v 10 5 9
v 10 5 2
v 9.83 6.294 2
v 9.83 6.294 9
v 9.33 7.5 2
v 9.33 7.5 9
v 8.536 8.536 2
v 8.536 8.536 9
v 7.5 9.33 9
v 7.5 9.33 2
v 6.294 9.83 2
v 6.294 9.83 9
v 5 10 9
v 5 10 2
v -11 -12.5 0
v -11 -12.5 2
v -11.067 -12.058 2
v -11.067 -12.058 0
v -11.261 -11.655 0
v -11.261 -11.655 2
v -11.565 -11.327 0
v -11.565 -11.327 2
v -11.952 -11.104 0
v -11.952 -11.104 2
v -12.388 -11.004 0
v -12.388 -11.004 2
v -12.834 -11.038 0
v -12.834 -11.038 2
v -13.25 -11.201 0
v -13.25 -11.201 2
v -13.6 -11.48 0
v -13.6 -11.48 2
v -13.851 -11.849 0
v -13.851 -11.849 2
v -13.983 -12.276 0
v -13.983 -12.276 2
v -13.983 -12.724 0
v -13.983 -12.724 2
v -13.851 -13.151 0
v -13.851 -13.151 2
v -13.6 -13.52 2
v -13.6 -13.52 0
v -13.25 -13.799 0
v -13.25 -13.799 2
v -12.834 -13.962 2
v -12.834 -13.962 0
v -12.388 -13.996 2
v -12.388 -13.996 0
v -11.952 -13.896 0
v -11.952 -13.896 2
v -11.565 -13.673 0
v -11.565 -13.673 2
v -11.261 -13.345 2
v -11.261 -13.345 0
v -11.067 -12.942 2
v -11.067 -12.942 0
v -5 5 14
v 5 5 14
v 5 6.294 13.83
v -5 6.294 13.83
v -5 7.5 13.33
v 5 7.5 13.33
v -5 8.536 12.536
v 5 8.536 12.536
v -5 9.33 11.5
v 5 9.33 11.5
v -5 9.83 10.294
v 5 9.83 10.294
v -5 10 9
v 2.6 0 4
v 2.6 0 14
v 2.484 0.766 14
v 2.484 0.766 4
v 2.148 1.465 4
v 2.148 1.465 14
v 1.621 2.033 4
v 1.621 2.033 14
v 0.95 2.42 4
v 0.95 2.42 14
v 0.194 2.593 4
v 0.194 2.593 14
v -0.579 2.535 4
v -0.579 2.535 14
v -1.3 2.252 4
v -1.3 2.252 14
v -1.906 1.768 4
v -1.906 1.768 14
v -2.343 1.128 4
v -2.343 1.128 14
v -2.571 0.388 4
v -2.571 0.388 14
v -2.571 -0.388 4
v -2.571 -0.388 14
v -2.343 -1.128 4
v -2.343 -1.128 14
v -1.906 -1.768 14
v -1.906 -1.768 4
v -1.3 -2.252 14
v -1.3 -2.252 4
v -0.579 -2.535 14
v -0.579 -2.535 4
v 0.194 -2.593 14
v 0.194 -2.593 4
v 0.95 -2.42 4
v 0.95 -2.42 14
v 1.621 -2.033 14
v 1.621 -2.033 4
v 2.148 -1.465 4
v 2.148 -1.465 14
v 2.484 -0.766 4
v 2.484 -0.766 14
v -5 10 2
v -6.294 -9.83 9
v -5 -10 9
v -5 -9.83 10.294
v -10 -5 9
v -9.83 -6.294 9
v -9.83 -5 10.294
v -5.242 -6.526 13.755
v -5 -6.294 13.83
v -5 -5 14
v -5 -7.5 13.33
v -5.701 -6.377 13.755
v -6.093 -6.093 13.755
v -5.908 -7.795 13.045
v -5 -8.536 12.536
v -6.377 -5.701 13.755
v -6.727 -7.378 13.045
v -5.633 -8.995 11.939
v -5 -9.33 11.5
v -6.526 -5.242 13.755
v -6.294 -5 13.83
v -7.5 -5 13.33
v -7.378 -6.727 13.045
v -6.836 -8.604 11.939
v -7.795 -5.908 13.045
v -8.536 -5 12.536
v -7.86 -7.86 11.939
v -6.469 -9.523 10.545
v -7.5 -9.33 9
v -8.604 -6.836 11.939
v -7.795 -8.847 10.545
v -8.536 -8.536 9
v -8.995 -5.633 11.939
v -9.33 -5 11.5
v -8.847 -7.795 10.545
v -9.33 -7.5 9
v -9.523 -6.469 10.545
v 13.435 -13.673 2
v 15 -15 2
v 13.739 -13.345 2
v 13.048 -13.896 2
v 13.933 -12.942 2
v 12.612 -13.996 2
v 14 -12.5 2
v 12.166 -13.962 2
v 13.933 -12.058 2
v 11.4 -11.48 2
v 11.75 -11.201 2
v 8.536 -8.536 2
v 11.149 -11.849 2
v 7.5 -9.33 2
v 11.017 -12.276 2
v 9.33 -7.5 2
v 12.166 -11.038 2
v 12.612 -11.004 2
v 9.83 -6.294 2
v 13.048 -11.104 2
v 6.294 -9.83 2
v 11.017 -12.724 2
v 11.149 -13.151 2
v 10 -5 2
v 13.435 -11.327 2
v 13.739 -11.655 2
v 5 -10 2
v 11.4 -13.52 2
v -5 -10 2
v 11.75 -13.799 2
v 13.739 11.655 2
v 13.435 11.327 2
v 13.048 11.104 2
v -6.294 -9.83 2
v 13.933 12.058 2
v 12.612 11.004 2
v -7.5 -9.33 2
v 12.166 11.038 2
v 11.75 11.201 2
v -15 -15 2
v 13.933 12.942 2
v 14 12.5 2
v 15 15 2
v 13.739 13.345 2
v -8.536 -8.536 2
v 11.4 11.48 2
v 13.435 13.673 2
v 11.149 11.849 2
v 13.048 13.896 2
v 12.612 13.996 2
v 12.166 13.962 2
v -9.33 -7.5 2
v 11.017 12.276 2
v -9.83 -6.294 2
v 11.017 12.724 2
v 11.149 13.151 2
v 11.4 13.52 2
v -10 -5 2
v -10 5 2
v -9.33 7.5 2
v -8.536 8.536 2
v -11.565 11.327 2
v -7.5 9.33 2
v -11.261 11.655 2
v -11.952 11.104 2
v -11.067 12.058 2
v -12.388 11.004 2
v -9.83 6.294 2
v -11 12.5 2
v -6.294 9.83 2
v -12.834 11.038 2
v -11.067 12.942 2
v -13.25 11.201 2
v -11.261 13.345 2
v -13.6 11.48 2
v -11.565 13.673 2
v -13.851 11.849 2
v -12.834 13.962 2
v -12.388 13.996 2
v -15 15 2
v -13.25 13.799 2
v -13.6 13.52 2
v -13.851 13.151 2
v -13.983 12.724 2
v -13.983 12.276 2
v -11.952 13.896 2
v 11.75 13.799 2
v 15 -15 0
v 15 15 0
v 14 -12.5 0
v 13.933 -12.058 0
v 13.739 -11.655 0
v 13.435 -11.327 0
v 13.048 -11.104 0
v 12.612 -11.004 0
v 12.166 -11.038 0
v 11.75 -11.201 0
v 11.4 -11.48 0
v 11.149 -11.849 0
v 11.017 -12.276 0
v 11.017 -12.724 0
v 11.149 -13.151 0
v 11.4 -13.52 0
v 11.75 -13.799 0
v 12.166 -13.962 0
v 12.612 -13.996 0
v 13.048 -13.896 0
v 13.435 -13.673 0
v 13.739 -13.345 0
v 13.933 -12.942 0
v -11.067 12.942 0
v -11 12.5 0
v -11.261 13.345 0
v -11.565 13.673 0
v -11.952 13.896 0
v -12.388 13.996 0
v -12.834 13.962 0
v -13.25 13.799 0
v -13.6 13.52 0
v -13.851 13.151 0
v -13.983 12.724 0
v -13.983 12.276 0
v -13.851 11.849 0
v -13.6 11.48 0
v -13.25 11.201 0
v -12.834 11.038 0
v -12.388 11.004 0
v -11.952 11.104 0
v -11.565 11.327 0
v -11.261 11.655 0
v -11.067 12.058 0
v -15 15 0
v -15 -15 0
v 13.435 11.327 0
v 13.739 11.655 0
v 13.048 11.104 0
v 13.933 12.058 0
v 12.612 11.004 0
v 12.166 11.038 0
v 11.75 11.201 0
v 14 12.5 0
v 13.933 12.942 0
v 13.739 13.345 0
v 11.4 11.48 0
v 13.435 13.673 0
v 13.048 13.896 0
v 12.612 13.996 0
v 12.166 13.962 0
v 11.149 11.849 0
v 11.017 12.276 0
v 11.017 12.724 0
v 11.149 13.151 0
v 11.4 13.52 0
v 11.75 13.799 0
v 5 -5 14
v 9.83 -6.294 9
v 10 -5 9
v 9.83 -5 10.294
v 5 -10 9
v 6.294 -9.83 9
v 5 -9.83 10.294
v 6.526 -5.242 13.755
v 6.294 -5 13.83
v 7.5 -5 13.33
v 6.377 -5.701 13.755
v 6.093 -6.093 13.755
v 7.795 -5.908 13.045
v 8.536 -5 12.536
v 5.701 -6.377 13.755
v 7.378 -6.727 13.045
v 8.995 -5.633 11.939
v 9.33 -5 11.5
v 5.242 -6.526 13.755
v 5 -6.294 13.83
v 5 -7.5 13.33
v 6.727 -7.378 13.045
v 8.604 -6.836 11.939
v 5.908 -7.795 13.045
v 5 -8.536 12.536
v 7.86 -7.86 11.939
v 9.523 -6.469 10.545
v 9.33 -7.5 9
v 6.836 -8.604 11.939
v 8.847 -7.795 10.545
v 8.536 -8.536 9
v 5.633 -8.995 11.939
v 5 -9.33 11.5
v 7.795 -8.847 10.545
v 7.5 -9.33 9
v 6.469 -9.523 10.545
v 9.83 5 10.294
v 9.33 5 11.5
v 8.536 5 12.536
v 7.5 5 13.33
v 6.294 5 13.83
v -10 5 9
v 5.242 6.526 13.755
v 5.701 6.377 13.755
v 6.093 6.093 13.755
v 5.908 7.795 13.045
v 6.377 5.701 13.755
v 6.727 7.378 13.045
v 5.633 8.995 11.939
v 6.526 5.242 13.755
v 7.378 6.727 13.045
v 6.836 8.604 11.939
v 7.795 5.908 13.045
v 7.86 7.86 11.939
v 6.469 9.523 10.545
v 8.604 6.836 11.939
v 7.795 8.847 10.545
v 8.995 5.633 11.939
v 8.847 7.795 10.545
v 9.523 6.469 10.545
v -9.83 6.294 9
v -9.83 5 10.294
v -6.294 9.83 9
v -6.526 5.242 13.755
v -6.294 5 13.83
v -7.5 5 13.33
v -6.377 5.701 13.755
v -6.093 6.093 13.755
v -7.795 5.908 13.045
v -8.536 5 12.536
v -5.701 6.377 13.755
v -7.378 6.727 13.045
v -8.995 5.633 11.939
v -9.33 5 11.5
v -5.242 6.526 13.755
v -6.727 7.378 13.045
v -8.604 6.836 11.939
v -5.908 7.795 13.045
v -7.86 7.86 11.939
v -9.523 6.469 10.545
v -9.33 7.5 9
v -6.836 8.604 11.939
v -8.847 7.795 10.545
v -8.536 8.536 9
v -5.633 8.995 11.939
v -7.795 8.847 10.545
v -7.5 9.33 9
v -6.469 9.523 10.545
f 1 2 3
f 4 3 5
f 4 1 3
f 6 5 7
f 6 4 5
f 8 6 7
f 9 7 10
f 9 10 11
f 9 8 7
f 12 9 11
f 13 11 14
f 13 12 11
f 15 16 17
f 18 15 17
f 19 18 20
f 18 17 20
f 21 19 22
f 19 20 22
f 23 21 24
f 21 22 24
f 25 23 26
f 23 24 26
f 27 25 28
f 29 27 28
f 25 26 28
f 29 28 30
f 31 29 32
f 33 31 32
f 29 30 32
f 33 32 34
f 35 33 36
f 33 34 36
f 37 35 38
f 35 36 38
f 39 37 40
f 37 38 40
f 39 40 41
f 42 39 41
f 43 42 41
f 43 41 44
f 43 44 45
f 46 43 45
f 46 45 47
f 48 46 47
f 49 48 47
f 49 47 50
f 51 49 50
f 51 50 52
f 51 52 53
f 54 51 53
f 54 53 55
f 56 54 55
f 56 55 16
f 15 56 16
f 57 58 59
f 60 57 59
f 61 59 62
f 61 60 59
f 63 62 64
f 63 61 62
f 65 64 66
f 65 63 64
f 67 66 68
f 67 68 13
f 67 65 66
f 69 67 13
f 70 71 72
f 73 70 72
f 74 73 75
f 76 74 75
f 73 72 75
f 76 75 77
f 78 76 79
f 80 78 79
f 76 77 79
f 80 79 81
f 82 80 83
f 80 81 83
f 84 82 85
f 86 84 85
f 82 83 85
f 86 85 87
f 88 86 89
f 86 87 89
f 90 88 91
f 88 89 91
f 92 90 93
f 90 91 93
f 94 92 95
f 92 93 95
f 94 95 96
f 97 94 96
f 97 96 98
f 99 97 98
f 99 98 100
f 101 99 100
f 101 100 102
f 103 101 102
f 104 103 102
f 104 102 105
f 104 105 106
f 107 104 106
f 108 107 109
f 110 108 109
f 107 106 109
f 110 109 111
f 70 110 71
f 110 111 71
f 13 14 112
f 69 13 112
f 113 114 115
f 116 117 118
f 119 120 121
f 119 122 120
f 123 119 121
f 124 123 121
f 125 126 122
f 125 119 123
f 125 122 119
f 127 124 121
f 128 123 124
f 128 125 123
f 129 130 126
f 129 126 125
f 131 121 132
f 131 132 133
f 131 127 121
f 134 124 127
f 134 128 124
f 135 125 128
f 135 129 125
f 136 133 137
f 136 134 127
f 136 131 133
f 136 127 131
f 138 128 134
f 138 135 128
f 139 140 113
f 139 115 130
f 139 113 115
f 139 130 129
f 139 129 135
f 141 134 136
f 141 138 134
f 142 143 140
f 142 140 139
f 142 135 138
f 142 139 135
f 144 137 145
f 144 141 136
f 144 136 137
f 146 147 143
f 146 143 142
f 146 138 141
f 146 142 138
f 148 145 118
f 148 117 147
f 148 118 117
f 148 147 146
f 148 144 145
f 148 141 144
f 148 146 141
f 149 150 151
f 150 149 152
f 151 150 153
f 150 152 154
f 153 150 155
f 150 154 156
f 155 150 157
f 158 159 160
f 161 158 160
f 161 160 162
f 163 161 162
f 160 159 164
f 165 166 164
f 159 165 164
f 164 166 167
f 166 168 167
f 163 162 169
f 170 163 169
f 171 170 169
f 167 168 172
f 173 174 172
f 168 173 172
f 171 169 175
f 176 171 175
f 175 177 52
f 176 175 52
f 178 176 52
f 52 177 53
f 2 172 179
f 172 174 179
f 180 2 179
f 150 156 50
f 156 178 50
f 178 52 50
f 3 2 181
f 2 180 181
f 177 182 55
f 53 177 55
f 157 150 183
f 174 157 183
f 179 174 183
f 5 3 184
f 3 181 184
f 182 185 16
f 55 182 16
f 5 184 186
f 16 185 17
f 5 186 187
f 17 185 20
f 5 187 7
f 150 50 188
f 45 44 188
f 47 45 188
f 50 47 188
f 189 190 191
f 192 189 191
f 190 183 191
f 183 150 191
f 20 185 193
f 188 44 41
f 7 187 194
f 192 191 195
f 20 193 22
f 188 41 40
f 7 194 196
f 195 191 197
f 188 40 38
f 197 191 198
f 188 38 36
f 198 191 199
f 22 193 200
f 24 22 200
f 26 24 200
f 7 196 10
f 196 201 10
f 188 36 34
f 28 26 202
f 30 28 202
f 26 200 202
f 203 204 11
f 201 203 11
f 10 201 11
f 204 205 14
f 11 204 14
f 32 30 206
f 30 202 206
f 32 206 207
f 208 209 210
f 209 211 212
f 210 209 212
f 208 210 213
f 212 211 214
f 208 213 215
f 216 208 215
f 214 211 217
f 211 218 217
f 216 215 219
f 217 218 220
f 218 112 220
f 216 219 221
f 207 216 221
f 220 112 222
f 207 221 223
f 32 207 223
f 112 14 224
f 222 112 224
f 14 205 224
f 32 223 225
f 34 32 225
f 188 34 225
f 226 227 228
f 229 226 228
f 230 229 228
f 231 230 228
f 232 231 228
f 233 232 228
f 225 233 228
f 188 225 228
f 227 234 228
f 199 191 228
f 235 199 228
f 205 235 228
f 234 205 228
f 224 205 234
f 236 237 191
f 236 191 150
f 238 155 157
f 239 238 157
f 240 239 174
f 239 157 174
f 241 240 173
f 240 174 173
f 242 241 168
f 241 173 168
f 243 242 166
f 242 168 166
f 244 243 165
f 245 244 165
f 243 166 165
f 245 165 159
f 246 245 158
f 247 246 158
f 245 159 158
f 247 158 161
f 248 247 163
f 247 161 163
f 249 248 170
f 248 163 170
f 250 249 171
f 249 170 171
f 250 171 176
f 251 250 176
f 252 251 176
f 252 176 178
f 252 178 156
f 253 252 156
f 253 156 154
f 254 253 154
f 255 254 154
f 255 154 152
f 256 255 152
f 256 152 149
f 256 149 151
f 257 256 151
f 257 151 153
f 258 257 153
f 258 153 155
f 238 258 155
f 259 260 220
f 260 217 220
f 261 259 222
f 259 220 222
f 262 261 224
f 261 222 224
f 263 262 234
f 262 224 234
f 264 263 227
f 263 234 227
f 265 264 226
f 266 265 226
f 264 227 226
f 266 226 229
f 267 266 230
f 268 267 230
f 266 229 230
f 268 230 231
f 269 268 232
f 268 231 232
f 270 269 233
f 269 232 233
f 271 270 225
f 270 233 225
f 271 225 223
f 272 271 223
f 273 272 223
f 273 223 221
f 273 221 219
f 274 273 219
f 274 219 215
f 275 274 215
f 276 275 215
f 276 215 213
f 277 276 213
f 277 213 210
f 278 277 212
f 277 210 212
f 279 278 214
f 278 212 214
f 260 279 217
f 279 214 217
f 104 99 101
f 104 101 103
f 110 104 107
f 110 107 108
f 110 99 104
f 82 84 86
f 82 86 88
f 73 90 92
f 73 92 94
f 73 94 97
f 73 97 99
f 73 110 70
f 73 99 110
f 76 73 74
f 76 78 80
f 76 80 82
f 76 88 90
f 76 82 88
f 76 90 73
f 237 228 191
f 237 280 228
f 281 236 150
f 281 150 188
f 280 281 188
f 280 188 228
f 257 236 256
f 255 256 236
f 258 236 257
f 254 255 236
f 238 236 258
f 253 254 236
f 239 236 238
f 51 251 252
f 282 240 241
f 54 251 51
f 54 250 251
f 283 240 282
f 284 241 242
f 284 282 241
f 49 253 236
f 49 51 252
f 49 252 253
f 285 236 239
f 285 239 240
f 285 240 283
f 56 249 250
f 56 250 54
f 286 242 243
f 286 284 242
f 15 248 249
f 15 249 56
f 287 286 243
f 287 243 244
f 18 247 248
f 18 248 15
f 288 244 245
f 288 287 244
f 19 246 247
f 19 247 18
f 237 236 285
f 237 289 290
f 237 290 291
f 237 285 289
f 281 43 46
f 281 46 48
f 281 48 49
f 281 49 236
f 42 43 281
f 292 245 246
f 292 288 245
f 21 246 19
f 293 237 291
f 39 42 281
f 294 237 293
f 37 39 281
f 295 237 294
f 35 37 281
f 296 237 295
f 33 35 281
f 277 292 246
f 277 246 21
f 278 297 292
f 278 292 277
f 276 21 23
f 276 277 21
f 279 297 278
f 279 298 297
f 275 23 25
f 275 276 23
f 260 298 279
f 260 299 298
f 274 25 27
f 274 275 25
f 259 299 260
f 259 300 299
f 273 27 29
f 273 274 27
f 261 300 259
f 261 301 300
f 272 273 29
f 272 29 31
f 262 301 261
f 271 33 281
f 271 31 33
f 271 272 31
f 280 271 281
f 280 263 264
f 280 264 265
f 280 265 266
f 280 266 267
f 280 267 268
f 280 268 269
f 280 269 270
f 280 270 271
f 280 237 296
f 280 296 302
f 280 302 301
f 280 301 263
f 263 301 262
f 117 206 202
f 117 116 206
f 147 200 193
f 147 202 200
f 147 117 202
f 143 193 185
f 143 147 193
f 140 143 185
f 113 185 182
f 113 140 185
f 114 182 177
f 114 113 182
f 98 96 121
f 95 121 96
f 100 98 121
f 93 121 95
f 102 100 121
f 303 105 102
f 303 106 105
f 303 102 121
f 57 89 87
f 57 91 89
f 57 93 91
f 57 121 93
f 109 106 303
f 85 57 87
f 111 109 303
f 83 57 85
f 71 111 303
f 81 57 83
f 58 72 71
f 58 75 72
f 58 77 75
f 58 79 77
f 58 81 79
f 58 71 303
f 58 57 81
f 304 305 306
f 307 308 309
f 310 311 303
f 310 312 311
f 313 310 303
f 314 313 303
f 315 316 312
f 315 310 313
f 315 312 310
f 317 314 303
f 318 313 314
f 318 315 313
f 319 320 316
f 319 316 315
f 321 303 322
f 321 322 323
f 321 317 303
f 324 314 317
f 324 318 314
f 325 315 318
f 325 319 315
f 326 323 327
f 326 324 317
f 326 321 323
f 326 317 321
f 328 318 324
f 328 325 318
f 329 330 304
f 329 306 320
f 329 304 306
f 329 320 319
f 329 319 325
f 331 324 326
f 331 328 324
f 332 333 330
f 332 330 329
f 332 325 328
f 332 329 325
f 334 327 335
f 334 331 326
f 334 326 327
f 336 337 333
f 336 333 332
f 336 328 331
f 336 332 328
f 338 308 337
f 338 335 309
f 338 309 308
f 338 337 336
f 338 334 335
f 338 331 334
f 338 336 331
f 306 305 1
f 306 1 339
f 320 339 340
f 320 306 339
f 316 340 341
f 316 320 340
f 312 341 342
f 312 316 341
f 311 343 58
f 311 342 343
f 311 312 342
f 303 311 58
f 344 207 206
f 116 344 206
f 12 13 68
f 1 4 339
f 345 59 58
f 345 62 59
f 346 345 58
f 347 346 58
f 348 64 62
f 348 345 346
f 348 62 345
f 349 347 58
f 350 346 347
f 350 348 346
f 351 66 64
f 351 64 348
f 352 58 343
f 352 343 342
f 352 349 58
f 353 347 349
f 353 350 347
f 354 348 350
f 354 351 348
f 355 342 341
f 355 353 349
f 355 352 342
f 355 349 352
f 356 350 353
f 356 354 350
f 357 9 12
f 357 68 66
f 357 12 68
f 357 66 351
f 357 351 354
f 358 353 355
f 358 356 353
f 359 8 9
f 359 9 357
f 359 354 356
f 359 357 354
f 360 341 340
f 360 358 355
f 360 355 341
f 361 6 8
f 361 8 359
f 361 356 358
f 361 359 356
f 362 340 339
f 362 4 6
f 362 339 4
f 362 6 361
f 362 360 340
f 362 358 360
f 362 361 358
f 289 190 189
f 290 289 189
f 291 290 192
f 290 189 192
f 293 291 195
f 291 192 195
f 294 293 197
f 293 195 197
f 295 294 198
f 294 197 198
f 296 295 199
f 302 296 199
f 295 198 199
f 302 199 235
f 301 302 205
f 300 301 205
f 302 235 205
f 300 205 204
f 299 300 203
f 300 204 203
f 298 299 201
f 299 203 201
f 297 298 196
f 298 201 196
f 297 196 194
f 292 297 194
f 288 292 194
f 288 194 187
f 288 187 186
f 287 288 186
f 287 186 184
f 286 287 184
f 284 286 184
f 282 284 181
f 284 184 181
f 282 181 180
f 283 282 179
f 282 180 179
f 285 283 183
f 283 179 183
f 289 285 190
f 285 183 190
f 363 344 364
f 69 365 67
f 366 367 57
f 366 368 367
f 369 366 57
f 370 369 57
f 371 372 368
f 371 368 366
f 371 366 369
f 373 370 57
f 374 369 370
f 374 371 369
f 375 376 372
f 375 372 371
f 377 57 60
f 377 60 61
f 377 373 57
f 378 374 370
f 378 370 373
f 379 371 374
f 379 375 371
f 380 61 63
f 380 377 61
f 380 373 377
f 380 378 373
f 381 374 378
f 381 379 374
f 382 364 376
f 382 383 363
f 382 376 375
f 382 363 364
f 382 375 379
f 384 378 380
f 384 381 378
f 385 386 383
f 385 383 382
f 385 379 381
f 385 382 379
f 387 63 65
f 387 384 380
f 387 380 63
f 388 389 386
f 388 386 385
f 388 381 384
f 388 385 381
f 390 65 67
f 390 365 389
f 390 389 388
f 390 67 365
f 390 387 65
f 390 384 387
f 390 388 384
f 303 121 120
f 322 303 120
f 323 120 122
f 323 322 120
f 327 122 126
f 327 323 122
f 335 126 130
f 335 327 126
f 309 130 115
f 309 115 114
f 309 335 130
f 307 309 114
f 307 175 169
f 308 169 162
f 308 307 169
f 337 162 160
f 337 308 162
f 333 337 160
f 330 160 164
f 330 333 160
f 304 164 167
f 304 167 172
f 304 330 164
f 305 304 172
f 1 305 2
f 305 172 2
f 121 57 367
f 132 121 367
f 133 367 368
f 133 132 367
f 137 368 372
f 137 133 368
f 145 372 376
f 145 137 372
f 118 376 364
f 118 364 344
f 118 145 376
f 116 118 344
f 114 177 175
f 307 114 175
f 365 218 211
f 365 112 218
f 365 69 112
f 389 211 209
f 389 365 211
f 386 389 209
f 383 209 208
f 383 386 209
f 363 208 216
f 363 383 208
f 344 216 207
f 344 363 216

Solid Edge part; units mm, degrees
sketch "Sketch1" plane through (0, 0, 0) normal (0, 0, 1) x (1, 0, 0)
  line L0 (0, 15) -> (15, 15)
  line L1 (15, 15) -> (15, -15)
  line L2 (15, -15) -> (-15, -15)
  line L3 (-15, -15) -> (-15, 15)
  line L4 (-15, 15) -> (0, 15)
extrude "Protrusion1" add sketch "Sketch1" along normal blind 2
sketch "Sketch2" plane through (0, 0, 2) normal (0, 0, 1) x (1, 0, 0)
  line L0 (10, 0) -> (10, 10)
  line L1 (10, 10) -> (-10, 10)
  line L2 (-10, 10) -> (-10, -10)
  line L3 (-10, -10) -> (10, -10)
  line L4 (10, -10) -> (10, 0)
extrude "ExtrudedProtrusion_2" add sketch "Sketch2" along normal blind 12
sketch "Sketch3" plane through (0, 0, 2) normal (0, 0, 1) x (1, 0, 0)
  circle A0 centre (-12.5, -12.5) radius 1.5
  circle A1 centre (12.5, -12.5) radius 1.5
  circle A2 centre (12.5, 12.5) radius 1.5
  circle A3 centre (-12.5, 12.5) radius 1.5
extrude "ExtrudedCutout_1" cut sketch "Sketch3" against normal blind 2
sketch "Sketch4" plane through (0, 0, 14) normal (0, 0, 1) x (1, 0, 0)
  circle A0 centre (0, 0) radius 2.6
extrude "ExtrudedCutout_2" cut sketch "Sketch4" against normal blind 10
fillet "Round_1" radius 5 8 edges at (-10, -10, 8) (-10, 10, 8) (10, -10, 8) (10, 10, 8) (0, 10, 14) (10, 0, 14) (0, -10, 14) (-10, 0, 14)
